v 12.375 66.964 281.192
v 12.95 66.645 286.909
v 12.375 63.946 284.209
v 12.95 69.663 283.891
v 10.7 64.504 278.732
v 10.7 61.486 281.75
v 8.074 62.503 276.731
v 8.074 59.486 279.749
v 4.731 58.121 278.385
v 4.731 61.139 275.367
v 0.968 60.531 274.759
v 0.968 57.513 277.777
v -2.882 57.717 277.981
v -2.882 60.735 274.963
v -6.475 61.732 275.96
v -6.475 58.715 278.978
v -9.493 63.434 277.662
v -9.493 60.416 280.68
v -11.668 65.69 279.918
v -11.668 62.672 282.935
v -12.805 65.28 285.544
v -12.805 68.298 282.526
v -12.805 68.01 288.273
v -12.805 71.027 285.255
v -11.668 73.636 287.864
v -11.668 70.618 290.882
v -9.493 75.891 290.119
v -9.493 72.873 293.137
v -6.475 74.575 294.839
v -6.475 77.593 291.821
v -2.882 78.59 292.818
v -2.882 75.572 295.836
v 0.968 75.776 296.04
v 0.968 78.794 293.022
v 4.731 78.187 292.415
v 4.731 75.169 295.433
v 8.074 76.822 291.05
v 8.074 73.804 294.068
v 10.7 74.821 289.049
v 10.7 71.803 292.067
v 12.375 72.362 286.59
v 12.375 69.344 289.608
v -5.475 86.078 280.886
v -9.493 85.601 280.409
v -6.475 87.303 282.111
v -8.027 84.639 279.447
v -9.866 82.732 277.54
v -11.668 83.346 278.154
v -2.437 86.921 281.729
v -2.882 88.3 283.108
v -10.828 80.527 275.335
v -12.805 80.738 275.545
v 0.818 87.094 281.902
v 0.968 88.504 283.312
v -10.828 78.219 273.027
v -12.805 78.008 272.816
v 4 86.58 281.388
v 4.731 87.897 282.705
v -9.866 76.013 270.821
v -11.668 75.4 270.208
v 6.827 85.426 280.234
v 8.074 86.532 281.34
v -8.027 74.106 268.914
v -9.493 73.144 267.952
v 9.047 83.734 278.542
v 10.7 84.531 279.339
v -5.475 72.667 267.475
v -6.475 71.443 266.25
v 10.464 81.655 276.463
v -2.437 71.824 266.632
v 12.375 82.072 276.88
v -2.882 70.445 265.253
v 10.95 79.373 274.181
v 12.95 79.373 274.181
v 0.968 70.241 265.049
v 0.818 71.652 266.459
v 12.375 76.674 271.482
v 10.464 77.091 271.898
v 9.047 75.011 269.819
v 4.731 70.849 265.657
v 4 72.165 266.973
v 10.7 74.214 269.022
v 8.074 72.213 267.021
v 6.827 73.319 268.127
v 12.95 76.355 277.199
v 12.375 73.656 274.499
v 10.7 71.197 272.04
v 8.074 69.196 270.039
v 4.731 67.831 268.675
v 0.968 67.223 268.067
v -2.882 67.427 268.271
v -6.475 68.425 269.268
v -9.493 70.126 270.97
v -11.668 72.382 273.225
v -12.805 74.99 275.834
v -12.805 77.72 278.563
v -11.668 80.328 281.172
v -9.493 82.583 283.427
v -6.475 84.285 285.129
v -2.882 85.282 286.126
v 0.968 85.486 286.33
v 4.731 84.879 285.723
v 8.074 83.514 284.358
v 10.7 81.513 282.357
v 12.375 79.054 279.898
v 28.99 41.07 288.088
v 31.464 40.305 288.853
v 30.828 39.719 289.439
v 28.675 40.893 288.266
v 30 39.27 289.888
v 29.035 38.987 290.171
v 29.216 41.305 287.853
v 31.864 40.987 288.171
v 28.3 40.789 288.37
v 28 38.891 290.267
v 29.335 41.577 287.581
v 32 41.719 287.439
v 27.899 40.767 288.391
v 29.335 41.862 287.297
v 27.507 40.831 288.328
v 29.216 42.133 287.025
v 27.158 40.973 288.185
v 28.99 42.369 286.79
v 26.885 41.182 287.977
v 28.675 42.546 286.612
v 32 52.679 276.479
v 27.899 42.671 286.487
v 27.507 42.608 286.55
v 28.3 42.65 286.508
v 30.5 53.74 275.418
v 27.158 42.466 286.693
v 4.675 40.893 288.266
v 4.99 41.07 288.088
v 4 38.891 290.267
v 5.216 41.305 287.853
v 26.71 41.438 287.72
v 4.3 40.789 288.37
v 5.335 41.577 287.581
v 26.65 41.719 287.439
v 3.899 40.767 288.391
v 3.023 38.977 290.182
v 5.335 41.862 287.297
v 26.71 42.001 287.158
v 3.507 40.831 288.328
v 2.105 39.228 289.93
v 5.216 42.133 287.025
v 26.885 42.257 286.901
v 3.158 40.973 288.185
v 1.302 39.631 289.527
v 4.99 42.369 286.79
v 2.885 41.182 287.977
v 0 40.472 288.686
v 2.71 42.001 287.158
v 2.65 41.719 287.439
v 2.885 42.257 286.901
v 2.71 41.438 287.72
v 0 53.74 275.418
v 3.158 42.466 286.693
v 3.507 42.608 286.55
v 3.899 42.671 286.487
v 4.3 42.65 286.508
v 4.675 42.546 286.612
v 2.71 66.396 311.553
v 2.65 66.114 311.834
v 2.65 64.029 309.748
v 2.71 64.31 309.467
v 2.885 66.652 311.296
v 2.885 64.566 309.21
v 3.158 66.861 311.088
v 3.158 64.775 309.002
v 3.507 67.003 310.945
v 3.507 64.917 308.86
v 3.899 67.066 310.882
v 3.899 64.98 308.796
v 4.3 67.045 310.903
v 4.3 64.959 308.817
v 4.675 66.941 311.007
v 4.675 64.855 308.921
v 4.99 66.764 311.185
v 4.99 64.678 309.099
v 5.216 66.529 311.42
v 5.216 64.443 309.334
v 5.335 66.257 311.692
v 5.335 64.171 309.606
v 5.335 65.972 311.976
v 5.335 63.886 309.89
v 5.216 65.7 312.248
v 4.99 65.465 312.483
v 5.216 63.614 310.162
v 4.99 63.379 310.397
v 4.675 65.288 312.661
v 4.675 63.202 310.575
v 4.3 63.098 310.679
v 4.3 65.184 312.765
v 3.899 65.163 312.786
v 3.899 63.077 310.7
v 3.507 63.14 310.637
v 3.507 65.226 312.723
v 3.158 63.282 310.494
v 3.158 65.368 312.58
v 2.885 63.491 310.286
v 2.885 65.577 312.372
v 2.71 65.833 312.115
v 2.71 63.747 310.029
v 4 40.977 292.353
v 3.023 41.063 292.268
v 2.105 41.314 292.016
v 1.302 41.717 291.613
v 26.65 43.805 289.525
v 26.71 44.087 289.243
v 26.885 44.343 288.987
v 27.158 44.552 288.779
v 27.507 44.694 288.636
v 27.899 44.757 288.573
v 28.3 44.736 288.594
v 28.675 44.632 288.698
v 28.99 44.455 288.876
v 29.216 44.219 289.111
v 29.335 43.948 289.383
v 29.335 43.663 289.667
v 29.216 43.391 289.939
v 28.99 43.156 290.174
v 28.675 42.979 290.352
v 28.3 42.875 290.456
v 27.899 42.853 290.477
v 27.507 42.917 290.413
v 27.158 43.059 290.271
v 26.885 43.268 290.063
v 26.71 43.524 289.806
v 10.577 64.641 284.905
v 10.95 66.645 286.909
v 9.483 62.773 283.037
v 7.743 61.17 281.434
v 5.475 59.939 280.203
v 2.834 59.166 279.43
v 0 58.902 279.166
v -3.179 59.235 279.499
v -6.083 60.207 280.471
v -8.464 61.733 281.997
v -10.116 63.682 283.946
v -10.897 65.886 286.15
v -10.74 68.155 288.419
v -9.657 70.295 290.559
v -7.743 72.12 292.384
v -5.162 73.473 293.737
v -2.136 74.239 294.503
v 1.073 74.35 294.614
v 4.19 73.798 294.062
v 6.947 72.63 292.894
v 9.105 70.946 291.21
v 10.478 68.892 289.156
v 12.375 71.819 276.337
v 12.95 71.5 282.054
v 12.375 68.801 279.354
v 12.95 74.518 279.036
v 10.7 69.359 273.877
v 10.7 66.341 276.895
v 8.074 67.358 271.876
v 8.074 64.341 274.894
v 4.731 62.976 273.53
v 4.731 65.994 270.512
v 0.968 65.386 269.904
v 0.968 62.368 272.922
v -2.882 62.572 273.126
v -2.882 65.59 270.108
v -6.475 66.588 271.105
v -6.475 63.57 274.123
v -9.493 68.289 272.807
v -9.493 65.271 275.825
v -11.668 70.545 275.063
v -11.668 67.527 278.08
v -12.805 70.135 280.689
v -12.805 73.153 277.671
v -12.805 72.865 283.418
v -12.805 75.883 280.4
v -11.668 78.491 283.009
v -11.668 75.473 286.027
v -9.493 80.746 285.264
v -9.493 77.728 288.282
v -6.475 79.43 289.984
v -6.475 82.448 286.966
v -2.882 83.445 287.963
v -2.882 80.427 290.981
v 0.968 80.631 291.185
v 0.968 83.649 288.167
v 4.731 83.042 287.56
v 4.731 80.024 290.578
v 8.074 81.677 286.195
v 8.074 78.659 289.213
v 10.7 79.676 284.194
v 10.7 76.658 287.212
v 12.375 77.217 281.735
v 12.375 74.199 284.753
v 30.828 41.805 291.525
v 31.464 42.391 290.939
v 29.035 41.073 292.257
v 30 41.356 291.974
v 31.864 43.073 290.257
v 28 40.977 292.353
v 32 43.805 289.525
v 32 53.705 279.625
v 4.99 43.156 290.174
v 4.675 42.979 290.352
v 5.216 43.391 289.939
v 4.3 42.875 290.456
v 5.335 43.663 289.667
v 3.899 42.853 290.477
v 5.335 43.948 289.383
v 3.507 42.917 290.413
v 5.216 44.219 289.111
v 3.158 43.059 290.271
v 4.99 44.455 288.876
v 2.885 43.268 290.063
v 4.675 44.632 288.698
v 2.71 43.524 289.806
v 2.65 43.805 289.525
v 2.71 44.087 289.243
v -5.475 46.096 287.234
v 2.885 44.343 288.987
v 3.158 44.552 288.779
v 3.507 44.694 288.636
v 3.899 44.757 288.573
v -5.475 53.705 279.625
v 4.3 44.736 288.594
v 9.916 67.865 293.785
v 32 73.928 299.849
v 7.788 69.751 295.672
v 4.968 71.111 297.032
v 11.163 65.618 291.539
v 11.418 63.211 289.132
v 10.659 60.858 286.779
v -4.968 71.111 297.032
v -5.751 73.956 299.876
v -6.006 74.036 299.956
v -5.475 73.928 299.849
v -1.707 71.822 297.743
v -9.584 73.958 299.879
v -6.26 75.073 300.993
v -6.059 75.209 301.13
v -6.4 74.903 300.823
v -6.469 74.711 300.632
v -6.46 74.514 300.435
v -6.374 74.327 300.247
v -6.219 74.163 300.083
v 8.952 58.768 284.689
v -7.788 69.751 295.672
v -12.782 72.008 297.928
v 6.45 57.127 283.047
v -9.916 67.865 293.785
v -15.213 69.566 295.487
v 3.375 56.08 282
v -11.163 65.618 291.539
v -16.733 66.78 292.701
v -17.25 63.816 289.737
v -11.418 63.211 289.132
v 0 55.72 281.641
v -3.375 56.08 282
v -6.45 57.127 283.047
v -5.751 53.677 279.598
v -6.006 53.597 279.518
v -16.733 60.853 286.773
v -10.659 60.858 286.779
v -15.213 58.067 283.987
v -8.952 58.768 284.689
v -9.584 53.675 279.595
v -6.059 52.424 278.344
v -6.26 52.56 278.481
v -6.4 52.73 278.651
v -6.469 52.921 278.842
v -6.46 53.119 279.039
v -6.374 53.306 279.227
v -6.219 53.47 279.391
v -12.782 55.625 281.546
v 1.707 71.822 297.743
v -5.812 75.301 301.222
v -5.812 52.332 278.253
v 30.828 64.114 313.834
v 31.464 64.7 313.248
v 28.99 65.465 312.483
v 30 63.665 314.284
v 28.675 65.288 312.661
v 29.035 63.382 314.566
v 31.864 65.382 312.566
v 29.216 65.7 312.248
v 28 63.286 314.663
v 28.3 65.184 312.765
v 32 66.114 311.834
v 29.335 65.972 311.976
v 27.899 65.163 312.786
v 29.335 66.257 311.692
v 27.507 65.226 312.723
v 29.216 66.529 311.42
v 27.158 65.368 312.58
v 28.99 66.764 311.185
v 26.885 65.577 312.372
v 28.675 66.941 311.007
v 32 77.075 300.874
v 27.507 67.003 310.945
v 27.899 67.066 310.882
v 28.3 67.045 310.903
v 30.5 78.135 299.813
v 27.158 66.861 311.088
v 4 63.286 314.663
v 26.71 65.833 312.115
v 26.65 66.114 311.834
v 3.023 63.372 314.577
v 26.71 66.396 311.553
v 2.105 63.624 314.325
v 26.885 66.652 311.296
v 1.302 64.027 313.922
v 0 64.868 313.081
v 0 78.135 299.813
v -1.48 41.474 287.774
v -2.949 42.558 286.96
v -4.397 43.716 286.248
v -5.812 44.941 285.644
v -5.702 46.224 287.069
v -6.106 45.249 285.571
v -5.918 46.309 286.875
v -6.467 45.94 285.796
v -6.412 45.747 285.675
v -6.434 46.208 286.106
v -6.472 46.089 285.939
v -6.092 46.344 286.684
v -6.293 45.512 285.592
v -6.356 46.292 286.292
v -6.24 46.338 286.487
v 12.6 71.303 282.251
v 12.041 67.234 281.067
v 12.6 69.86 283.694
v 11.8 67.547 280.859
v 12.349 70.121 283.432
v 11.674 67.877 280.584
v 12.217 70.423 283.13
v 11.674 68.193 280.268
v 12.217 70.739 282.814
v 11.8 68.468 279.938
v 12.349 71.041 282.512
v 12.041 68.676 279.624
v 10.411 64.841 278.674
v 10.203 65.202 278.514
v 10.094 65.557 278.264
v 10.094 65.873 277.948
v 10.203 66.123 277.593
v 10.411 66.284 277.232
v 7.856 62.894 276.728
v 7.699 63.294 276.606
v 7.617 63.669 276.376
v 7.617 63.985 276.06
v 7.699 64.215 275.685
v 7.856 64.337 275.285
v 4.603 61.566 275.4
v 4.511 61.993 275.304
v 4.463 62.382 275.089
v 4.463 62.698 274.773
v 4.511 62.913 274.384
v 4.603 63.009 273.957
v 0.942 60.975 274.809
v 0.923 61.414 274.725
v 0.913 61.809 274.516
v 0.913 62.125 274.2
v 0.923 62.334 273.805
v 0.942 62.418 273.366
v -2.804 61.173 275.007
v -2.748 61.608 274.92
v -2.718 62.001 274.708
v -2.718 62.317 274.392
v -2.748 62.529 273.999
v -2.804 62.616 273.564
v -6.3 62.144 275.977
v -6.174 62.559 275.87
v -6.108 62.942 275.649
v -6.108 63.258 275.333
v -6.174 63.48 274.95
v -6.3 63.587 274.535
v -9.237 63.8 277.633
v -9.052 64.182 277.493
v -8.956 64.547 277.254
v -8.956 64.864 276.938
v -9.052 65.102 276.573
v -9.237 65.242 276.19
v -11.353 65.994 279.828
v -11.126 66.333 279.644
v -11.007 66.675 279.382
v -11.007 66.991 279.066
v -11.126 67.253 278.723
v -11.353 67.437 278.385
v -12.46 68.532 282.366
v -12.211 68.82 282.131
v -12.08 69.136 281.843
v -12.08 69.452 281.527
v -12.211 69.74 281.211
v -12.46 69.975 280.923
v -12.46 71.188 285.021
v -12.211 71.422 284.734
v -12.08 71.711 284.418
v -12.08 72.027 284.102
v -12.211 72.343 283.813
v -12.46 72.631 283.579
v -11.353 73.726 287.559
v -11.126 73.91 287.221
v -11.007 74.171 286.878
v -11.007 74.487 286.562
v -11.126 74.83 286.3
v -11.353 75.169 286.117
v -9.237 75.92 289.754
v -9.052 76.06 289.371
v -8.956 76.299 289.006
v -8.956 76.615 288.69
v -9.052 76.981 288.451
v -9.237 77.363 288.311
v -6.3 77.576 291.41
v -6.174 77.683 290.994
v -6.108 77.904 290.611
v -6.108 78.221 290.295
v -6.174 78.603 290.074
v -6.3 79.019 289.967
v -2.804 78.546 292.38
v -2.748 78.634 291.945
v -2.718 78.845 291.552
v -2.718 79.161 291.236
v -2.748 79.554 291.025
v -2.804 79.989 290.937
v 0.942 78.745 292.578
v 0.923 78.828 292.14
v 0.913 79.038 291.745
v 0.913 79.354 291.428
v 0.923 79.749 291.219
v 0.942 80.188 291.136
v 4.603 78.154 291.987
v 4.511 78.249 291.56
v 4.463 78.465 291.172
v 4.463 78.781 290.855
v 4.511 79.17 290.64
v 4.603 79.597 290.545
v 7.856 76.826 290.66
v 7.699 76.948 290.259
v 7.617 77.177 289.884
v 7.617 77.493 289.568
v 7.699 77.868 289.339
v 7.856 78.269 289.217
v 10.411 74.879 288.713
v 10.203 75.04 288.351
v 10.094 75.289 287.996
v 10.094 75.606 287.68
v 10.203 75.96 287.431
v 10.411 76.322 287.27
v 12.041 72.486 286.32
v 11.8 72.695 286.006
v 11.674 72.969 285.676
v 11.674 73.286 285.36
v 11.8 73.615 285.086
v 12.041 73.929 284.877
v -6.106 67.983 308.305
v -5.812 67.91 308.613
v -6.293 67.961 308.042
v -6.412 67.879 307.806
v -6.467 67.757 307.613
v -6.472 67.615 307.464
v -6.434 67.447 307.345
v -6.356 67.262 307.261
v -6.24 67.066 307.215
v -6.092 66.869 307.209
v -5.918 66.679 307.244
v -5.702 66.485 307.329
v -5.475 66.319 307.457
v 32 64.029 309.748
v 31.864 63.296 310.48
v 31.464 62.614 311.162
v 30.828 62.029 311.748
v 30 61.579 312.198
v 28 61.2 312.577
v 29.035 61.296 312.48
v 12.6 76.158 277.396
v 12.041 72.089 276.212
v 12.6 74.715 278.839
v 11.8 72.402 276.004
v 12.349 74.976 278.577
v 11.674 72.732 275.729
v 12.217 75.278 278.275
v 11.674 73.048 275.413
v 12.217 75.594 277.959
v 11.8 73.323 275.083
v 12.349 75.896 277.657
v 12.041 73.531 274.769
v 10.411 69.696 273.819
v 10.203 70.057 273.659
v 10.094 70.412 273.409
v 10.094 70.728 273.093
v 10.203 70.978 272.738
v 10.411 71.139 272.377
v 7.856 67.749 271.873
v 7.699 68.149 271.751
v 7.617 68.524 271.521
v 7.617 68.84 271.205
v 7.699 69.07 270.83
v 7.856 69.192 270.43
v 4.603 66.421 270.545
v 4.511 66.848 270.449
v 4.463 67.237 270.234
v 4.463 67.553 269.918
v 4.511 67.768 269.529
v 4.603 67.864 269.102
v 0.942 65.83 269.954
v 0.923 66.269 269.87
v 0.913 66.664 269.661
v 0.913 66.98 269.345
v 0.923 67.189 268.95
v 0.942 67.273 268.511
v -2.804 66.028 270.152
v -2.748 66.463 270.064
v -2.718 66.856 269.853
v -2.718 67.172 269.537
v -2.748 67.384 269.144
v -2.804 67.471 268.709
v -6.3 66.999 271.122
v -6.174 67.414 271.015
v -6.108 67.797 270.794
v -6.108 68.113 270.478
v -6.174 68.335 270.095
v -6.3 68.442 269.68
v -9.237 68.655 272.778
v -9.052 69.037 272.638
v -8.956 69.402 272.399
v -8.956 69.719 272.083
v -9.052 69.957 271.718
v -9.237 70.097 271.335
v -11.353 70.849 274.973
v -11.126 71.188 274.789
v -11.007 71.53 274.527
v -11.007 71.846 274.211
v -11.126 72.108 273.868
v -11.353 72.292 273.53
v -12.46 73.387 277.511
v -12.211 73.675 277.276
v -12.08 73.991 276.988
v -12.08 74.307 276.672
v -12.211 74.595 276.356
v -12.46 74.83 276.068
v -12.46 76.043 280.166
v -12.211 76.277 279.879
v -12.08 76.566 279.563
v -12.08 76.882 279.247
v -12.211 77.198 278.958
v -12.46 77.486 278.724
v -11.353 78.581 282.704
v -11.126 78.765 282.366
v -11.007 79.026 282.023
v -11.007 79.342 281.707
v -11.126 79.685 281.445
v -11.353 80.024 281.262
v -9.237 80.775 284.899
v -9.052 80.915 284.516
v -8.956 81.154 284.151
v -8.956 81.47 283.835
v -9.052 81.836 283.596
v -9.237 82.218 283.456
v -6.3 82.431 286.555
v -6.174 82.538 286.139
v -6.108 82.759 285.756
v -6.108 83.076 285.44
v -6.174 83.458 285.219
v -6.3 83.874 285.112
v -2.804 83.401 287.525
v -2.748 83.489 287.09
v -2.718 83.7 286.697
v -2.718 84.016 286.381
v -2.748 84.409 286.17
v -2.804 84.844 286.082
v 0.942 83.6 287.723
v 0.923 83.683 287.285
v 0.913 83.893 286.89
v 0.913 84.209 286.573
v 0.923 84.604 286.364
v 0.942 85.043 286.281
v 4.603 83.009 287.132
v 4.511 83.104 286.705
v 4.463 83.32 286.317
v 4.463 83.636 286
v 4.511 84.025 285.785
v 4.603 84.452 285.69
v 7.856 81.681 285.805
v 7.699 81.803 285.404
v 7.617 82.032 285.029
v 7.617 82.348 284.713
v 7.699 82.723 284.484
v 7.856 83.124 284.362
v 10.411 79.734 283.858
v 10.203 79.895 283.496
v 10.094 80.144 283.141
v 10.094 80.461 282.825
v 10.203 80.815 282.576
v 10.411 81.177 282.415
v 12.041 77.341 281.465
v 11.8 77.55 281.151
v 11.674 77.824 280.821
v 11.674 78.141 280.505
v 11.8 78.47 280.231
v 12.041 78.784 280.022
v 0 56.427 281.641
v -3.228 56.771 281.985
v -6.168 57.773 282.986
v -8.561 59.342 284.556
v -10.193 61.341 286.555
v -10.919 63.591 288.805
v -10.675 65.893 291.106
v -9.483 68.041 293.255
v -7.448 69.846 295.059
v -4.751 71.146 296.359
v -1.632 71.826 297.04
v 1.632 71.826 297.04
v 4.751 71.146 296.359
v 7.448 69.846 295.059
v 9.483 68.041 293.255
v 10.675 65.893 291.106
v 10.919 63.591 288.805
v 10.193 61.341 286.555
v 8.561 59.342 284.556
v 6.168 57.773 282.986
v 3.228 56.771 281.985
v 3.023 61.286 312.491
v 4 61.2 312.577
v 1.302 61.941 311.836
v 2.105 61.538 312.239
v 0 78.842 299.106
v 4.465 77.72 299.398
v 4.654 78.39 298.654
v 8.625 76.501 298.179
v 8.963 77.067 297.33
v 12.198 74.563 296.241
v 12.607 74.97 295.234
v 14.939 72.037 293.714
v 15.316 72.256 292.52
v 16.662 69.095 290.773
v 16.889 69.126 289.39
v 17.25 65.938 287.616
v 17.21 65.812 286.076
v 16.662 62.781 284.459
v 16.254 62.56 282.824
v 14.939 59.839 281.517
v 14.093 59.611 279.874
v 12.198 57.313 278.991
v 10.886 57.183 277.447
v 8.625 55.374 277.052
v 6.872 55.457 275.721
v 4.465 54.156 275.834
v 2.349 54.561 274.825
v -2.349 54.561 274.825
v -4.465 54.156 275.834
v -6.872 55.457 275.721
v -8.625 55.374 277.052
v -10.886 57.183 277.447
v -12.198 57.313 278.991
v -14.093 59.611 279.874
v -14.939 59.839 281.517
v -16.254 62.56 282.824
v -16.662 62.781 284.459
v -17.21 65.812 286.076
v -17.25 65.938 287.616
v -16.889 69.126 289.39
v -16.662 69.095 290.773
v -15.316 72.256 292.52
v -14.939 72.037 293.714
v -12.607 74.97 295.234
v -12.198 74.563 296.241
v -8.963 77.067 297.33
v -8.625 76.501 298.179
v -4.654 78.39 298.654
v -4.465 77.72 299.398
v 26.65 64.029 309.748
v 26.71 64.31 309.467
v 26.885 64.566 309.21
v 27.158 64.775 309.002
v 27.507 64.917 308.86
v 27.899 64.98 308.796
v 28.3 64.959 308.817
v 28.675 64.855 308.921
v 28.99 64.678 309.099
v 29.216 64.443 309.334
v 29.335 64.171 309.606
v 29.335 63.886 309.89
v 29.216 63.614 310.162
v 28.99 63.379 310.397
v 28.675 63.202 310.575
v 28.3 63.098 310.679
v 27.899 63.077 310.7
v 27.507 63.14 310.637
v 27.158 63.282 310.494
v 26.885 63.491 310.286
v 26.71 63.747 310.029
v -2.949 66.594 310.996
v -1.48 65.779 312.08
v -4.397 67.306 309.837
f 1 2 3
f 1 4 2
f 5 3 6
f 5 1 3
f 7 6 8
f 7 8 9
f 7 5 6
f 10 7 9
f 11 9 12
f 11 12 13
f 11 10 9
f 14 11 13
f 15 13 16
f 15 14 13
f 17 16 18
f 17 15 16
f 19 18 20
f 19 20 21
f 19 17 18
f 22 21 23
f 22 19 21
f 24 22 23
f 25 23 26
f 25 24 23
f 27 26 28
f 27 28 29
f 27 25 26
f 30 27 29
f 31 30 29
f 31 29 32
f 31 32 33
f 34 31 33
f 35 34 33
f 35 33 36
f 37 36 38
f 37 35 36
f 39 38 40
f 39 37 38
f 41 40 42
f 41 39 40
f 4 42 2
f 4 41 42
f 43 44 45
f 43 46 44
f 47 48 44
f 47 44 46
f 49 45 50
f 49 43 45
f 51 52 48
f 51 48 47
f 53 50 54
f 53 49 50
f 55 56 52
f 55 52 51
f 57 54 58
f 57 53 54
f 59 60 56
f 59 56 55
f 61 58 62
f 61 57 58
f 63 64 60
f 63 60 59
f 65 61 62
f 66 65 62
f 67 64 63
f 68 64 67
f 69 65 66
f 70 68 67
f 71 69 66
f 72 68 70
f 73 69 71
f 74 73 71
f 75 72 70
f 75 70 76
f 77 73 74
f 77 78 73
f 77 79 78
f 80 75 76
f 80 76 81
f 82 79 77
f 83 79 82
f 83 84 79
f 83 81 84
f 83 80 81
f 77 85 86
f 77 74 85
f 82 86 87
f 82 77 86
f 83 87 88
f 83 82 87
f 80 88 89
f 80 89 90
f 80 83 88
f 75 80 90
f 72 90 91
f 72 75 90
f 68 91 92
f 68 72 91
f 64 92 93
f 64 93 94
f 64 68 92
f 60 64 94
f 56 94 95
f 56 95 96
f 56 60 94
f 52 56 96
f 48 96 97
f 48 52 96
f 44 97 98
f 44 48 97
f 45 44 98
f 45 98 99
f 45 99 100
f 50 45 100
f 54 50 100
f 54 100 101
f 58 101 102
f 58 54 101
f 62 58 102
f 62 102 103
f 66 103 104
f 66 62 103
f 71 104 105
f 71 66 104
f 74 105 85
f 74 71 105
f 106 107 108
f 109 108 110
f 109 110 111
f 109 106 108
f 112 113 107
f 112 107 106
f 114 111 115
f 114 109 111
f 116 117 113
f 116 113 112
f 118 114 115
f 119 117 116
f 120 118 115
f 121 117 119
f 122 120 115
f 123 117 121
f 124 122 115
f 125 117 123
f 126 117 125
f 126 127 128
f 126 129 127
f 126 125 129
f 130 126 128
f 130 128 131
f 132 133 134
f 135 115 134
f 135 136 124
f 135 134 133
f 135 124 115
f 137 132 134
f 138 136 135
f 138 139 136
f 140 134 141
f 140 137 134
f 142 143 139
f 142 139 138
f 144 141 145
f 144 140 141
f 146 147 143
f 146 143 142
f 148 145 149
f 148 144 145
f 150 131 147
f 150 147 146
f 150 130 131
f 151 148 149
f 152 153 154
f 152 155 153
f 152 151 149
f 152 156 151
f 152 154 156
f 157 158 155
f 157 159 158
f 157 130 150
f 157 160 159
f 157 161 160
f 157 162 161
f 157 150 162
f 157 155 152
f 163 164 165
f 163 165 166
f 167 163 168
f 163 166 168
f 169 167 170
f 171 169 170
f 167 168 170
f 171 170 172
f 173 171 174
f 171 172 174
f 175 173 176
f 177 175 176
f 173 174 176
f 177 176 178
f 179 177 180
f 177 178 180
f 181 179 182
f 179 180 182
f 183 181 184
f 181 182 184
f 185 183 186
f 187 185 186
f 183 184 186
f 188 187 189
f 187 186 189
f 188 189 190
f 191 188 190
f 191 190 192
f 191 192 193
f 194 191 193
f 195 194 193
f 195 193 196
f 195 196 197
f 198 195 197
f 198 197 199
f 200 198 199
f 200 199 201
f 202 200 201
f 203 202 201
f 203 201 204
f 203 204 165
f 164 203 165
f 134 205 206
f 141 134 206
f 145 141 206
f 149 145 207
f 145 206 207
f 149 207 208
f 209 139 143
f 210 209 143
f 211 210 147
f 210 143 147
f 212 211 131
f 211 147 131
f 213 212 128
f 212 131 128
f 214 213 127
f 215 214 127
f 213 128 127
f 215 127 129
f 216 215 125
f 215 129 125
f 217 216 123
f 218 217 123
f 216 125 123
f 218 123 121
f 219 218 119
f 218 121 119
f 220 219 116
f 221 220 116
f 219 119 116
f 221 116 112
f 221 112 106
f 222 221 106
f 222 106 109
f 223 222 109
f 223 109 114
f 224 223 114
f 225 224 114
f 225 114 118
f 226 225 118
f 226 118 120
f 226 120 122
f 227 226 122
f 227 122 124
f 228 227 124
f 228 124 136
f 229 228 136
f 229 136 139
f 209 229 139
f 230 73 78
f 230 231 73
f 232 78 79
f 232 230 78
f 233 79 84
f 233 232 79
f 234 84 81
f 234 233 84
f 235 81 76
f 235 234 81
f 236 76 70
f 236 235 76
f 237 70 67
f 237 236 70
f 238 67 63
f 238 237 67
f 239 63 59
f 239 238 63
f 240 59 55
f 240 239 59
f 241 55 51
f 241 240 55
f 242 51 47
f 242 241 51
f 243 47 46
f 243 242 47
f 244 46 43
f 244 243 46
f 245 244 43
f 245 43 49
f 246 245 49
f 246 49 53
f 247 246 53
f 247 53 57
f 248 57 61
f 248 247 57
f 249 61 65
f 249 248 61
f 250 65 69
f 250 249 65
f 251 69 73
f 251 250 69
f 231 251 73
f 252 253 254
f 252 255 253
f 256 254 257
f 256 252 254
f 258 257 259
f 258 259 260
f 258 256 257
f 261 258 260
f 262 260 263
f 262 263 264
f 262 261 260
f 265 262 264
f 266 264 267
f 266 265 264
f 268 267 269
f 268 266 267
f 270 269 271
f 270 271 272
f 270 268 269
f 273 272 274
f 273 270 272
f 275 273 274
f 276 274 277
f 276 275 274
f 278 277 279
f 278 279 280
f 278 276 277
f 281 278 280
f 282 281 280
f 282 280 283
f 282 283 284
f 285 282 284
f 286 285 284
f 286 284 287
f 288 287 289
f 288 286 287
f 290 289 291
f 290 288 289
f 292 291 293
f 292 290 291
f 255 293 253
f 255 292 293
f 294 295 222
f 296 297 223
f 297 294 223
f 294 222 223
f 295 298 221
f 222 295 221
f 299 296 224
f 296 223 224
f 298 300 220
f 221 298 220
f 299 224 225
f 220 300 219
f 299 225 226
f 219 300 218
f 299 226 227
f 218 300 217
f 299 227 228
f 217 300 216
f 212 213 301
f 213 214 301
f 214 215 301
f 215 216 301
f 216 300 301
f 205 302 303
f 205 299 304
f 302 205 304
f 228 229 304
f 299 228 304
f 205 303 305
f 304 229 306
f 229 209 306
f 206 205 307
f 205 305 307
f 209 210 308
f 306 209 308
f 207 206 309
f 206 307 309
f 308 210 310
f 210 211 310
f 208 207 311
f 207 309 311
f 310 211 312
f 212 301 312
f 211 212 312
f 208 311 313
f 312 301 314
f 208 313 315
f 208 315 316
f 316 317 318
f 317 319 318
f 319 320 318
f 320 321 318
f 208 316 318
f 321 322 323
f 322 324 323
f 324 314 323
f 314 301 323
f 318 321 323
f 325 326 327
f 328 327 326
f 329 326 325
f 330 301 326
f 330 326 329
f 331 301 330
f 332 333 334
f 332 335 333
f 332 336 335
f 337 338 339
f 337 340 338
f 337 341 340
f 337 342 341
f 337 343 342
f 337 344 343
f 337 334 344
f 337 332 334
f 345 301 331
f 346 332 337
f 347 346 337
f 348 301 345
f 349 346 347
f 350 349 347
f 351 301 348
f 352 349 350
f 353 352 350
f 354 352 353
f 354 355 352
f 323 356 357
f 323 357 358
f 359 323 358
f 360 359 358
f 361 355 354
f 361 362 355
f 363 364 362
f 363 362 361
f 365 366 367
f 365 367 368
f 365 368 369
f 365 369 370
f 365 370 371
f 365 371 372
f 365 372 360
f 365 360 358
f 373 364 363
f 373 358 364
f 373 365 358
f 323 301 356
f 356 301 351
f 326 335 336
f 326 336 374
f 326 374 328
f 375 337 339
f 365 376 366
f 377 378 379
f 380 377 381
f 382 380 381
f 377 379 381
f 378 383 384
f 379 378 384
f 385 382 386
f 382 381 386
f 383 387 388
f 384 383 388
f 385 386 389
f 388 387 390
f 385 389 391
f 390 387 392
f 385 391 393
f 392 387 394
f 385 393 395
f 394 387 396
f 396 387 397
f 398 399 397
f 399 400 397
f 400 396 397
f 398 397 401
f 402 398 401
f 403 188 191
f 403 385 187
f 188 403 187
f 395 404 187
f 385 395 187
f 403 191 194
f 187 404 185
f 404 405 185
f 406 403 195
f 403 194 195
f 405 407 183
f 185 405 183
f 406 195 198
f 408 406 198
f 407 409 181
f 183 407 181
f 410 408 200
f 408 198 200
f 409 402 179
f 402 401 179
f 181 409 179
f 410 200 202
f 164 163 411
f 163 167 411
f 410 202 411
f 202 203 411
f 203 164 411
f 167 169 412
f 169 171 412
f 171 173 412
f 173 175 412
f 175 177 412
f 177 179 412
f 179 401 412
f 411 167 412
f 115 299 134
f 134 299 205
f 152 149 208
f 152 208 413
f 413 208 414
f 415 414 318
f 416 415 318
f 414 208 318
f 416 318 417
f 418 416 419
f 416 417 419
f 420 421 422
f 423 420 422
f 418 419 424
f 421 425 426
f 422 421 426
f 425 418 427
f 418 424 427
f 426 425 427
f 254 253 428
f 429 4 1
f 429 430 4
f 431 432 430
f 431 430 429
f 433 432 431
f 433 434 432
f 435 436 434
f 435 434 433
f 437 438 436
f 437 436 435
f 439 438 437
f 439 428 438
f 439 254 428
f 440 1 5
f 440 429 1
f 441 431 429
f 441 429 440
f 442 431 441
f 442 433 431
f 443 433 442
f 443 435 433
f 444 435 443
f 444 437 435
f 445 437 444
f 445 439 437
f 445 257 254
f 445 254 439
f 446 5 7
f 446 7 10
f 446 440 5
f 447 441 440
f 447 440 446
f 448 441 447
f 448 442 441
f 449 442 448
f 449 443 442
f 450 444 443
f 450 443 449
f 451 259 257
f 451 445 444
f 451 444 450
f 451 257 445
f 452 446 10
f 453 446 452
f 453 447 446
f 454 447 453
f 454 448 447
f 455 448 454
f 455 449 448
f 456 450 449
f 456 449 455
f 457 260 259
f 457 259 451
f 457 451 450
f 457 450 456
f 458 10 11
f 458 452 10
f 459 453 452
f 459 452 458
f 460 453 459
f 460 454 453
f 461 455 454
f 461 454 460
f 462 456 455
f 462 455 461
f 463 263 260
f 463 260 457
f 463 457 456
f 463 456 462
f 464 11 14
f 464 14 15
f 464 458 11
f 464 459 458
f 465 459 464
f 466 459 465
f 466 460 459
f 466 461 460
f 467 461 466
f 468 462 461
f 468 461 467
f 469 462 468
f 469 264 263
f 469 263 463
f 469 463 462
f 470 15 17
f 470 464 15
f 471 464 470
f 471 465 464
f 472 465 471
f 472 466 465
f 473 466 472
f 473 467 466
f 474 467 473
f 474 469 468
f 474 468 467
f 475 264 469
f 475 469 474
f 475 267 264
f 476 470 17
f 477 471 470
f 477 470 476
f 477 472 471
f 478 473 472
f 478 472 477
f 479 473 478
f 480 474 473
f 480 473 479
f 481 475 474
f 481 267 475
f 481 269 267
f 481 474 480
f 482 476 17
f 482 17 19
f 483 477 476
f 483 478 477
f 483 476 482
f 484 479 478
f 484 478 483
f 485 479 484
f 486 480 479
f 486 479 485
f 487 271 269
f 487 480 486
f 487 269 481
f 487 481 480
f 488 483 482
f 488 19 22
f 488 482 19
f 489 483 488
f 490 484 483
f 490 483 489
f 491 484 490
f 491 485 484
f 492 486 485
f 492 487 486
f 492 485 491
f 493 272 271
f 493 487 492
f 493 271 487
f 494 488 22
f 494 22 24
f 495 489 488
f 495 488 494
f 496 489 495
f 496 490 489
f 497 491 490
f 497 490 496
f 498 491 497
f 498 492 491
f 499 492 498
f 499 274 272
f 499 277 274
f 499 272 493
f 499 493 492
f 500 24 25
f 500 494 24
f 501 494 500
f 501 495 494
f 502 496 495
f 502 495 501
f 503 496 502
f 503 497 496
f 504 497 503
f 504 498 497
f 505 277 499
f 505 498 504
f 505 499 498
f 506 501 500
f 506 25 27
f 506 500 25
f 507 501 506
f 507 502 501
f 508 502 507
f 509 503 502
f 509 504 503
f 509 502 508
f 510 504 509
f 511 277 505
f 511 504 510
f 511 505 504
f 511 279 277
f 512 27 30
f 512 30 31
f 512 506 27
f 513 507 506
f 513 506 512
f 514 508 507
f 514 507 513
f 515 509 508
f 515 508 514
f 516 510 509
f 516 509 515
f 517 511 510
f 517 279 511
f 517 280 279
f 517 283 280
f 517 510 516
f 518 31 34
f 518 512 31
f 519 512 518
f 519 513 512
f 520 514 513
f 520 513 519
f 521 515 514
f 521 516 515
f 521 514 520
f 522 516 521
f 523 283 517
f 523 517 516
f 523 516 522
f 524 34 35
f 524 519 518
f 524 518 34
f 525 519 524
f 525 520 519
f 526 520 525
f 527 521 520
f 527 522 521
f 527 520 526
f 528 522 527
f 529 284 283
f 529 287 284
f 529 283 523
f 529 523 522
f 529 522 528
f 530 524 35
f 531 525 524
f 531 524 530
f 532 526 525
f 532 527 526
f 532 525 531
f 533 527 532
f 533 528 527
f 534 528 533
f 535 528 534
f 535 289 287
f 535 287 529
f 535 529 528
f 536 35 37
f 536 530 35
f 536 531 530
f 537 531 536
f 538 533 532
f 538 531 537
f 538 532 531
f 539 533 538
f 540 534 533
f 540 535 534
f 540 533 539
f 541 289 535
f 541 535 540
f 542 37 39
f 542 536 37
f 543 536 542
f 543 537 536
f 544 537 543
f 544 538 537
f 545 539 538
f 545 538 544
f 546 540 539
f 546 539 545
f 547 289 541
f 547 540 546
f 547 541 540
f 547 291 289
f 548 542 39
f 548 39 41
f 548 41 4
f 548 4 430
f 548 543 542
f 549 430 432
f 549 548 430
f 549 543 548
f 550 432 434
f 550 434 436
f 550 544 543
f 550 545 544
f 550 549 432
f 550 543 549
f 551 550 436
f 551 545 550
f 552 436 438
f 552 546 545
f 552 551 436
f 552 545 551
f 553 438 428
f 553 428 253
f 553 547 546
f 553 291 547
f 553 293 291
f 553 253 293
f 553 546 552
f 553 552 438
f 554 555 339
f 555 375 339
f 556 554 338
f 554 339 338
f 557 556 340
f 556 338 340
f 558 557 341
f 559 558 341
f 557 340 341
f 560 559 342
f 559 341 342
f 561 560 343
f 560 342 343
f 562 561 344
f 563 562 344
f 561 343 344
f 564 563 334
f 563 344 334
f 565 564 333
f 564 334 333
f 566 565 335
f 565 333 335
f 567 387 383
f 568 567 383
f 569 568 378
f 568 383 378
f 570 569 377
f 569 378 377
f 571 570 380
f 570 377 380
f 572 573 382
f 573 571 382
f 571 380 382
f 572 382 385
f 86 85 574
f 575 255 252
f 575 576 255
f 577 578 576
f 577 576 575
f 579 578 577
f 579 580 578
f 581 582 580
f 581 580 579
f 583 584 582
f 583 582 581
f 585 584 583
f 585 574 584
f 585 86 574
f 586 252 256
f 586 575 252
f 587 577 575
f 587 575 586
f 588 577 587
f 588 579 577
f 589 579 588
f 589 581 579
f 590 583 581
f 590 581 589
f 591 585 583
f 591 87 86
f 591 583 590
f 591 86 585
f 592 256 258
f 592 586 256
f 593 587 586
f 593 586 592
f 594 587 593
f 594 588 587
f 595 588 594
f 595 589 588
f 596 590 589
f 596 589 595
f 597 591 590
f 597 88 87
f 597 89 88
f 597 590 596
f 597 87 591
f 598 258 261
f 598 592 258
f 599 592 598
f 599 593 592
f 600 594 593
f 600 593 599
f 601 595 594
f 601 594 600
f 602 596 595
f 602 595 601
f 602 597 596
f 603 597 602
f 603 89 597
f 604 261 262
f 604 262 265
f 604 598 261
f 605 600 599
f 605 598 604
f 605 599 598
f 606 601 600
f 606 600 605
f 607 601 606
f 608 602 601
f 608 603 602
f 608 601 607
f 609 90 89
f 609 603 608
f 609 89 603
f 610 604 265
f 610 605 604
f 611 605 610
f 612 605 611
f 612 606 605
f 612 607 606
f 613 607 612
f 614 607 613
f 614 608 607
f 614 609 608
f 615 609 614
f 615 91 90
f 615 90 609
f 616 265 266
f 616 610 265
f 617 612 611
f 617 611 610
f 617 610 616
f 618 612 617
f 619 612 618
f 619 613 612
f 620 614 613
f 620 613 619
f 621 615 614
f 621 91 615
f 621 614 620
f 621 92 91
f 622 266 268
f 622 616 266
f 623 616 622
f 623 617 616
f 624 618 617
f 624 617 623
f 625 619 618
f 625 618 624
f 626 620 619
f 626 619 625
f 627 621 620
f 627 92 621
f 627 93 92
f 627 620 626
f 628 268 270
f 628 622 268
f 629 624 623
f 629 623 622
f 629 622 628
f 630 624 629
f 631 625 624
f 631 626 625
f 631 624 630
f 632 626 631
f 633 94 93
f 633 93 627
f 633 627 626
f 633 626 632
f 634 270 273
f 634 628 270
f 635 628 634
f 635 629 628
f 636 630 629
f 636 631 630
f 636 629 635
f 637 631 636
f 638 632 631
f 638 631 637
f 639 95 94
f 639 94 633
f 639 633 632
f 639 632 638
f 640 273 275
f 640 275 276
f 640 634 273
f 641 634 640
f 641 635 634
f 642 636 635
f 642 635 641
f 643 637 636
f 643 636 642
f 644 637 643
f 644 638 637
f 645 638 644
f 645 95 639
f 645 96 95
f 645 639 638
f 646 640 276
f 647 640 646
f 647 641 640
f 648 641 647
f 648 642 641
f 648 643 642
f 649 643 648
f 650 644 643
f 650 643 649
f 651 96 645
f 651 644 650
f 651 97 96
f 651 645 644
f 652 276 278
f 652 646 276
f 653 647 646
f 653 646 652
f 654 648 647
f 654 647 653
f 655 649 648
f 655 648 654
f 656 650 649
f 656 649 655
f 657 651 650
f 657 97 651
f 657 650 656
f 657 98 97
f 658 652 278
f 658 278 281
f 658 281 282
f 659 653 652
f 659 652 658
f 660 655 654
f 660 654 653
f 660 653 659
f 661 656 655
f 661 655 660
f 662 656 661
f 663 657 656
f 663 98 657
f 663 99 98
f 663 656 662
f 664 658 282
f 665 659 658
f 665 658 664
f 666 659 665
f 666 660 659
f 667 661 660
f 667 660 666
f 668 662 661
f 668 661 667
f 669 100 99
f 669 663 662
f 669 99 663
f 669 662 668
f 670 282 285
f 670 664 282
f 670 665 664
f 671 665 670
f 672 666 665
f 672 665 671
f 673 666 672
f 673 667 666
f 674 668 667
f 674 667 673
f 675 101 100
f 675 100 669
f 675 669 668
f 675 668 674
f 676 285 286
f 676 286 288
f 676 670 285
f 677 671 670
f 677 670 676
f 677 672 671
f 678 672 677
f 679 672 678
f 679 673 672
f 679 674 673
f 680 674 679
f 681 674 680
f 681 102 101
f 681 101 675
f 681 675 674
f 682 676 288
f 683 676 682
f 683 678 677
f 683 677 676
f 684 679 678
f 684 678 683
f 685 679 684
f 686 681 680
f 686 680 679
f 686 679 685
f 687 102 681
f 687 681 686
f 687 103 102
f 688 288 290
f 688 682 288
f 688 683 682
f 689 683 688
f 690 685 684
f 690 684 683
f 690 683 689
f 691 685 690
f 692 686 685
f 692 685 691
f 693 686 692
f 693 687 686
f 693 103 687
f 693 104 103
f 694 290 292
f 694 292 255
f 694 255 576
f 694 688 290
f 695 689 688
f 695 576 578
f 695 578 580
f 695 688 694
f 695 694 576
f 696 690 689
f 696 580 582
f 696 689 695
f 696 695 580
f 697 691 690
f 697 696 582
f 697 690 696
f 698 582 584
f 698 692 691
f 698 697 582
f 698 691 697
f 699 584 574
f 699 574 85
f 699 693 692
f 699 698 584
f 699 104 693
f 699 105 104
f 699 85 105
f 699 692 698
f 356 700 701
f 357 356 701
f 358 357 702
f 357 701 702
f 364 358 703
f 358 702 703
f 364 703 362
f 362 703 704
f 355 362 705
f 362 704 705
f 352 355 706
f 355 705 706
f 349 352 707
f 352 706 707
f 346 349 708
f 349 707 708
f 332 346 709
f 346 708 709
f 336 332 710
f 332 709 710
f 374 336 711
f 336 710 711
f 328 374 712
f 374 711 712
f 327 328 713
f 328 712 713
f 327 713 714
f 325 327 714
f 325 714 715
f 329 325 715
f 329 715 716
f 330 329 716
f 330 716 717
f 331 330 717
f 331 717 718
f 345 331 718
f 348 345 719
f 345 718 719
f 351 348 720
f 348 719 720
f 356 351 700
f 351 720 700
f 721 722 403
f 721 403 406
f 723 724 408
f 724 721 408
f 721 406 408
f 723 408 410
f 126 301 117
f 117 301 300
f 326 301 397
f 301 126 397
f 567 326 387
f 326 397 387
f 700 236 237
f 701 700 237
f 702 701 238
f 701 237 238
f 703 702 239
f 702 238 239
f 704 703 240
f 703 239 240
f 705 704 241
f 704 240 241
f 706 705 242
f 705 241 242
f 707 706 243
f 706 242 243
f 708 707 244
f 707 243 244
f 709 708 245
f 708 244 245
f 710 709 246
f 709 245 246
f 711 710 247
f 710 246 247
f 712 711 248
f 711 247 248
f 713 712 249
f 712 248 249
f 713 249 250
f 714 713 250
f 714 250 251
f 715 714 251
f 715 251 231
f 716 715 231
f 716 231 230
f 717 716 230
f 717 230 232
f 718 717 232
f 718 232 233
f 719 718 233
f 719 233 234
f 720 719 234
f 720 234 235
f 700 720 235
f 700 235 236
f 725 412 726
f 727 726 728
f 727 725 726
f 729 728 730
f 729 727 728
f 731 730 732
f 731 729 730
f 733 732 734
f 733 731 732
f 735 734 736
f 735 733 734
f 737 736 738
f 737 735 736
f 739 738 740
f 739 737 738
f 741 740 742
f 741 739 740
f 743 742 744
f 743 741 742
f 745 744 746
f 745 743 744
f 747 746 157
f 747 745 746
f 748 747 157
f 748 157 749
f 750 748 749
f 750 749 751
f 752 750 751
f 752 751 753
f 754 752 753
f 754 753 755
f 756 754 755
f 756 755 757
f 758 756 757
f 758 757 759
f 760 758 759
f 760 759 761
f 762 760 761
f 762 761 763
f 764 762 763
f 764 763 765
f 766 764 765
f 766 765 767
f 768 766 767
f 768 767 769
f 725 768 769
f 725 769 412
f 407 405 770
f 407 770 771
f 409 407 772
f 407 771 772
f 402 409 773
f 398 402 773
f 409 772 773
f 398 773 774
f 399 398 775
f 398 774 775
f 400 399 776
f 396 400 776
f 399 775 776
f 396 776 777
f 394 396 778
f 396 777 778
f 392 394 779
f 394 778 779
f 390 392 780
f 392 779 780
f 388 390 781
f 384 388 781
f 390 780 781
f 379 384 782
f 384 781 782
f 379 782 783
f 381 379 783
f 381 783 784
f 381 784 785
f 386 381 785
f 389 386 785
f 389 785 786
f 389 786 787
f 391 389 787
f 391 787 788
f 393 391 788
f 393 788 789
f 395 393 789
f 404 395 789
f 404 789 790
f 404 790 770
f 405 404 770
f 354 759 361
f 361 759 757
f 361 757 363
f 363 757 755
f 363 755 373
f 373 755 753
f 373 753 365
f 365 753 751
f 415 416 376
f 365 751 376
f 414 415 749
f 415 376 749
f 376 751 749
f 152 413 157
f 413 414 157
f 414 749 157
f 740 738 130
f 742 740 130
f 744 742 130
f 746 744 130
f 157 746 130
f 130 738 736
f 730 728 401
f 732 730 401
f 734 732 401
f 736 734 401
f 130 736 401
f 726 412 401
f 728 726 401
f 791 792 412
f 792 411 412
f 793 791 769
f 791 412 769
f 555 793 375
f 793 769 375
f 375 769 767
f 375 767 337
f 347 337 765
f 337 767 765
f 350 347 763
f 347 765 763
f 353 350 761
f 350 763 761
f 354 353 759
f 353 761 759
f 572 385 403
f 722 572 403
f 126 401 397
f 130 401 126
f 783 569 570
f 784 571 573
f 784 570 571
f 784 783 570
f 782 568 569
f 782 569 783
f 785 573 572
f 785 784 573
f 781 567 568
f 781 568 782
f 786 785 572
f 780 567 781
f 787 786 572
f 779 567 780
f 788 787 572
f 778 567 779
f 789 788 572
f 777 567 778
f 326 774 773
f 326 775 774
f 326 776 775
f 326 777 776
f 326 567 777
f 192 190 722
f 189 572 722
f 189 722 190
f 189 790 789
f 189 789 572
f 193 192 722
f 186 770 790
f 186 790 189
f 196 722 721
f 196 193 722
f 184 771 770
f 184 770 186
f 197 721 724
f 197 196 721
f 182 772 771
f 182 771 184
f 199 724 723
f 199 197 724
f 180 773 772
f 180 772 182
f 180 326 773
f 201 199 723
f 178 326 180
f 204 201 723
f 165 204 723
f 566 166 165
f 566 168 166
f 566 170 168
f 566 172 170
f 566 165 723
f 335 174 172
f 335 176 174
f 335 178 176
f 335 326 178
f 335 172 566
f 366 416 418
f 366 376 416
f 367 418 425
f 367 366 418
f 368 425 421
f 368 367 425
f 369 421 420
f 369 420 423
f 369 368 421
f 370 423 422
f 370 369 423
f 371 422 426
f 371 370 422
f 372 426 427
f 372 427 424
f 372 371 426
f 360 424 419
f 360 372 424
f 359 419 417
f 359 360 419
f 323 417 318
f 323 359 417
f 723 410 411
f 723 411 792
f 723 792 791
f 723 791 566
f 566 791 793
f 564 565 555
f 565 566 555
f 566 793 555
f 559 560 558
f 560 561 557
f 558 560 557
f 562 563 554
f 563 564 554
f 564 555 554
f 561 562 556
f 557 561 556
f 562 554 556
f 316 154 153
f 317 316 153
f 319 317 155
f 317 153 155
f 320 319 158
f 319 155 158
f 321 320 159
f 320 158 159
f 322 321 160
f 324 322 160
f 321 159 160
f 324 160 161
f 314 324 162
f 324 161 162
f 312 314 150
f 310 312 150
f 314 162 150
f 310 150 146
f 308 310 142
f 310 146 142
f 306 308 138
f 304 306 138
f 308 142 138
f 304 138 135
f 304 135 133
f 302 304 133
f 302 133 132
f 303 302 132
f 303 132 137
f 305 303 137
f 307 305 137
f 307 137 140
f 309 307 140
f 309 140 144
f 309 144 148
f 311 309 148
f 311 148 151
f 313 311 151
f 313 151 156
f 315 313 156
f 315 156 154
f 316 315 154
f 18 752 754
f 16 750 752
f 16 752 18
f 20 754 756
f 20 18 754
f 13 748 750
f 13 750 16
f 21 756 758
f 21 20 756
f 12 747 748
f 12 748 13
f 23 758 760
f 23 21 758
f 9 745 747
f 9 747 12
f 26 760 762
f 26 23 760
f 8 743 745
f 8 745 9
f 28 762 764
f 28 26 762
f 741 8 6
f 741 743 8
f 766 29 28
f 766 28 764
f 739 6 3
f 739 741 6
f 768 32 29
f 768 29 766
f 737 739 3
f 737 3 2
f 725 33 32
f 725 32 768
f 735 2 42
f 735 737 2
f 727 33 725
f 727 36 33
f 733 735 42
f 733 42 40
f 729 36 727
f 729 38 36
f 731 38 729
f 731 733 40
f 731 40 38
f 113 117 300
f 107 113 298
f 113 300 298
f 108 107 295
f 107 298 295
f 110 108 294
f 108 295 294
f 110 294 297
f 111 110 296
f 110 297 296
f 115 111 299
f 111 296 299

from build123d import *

# Parameters (mm, degrees)
SKETCH11_R               = 17.249999999999545
BOSS_EXTRUDE2_DEPTH      = 1
BOSS_EXTRUDE1_DEPTH      = 17.25
BOSS_EXTRUDE1_DEPTH_BACK = 17.25
CUT_EXTRUDE1_START       = -14.25
SKETCH8_W                = 52.49999999999948
SKETCH8_H                = 37.00000000000014
CUT_EXTRUDE1_DEPTH       = 28.5
M2_5_CLEARANCE_HOLE1_D   = 2.7
CUT_EXTRUDE2_DEPTH       = 287.9075330139404
MOVE_FACE1_BY            = 0.05
MOVE_FACE1_2_BY          = 0.05
FILLET3_R                = 1
SKETCH13_R               = 10.949999999999743
CUT_EXTRUDE3_DEPTH       = 287.92025460072404
CHAMFER1_SIZE            = 0.5
CHAMFER2_SIZE            = 1.5


# Read off the part's stored shape, not the designer's step: Glue_In_Plug
with BuildPart() as part:
    # Glue_In_Plug outline → Glue_In_Plug (revolve)
    with BuildSketch(Plane(origin=(0, 176.776695297, 176.776695297), x_dir=(1, 0, 0), z_dir=(0, 0.707106781186551, 0.707106781186544))):
        with BuildLine():
            Line((12.95, -137.75), (10.95, -137.75))
            Line((10.95, -137.75), (10.95, -156.75))
            Line((10.95, -156.75), (15, -156.75))
            Line((15, -156.75), (15, -155.75))
            Line((15, -155.75), (12.95, -155.75))
            Line((12.95, -155.75), (12.95, -151.482050808))
            ThreePointArc((12.95, -151.482050808), (12.2, -150.183012702), (12.95, -148.883974596))
            Line((12.95, -148.883974596), (12.95, -144.616025404))
            ThreePointArc((12.95, -144.616025404), (12.2, -143.316987298), (12.95, -142.017949192))
            Line((12.95, -142.017949192), (12.95, -137.75))
        make_face()
    revolve(axis=Axis((0, 176.776695297, 176.776695297), (0, 0.707106781186544, -0.707106781186551)))

    # Sketch11 → Boss-Extrude2 (add)
    with BuildSketch(Plane(origin=(0, -110.13188116980581, 110.13188116980702), x_dir=(1, 0, 0), z_dir=(0, 0.7071067811865438, -0.7071067811865513))):
        with Locations(Location((0, -250, 0), (0, 0, 270))):
            Circle(SKETCH11_R)
    extrude(amount=-BOSS_EXTRUDE2_DEPTH)

    # Sketch6 → Boss-Extrude1 (add, two sides: drawn at the far end of the back side and taken through both)
    with BuildSketch(Plane(origin=(0, 176.7766952966368, 176.77669529663697), x_dir=(-1, 0, 0), z_dir=(0, -0.7071067811865477, -0.7071067811865475)).offset(-BOSS_EXTRUDE1_DEPTH_BACK)):
        with BuildLine():
            Line((-32, -156.75000000000077), (-32.00000000000001, -173.7500000000009))
            ThreePointArc((-32.00000000000001, -173.7500000000009), (-30.828427124746195, -176.5784271247471), (-27.999999999999996, -177.75000000000088))
            Line((-27.999999999999996, -177.75000000000088), (-4.0000000000000036, -177.75000000000088))
            ThreePointArc((-4.0000000000000036, -177.75000000000088), (-2.5528006726860175, -177.47902321084604), (-1.3016800588632904, -176.7028070535119))
            Line((-1.3016800588632904, -176.7028070535119), (17.249999999999545, -159.75000000000082))
            Line((17.249999999999545, -159.75000000000082), (17.249999999999545, -156.75000000000077))
            Line((17.249999999999545, -156.75000000000077), (-32, -156.75000000000077))
        make_face()
    extrude(amount=BOSS_EXTRUDE1_DEPTH + BOSS_EXTRUDE1_DEPTH_BACK)

    # Sketch8 → Cut-Extrude1 (cut)
    with BuildSketch(Plane(origin=(0, 176.7766952966368, 176.77669529663697), x_dir=(-1, 0, 0), z_dir=(0, -0.7071067811865477, -0.7071067811865475)).offset(CUT_EXTRUDE1_START)):
        with Locations((-9.000000000000195, -178.2500000000009)):
            Rectangle(SKETCH8_W, SKETCH8_H)
    extrude(amount=CUT_EXTRUDE1_DEPTH, mode=Mode.SUBTRACT)

    # M2.5 Clearance Hole1 (through all)
    with Locations(Plane(origin=(0, 188.97428727210456, 188.9742872721045), x_dir=(1, 0, 0), z_dir=(0, 0.7071067811865476, 0.7071067811865476))):
        with Locations((4, -173.75), (28, -173.75)):
            Hole(M2_5_CLEARANCE_HOLE1_D / 2)

    # Sketch12 → Cut-Extrude2 (cut, through all)
    with BuildSketch(Plane(origin=(0, -110.838987950992, 110.83898795099203), x_dir=(1, 7e-16, -7e-16), z_dir=(0, 0.7071067811865476, -0.7071067811865476))):
        with BuildLine():
            Line((-17.249999999999545, -250.00000000000088), (-17.249999999999545, -267.24999999999955))
            Line((-17.249999999999545, -267.24999999999955), (0, -267.24999999999955))
            ThreePointArc((-6.1e-16, -267.24999999999955), (-12.197591975467768, -262.1975919754684), (-17.249999999999538, -250.00000000000088))
        make_face()
        with BuildLine():
            Line((-17.249999999999545, -232.7499999999995), (-17.249999999999545, -250.00000000000088))
            ThreePointArc((-17.24999999999954, -250.00000000000088), (-12.197591975468656, -237.80240802453167), (0, -232.7499999999995))
            Line((0, -232.7499999999995), (-17.249999999999545, -232.7499999999995))
        make_face()
    extrude(amount=-CUT_EXTRUDE2_DEPTH, mode=Mode.SUBTRACT)

    # Move Face1: a face moved inward by 0.05
    extrude(part.faces().sort_by_distance((12.658853914, 47.847886018, 285.552961311))[0], amount=MOVE_FACE1_BY, dir=(0, -0.707106781, -0.707106781), mode=Mode.SUBTRACT)

    # Move Face1 2: a face moved inward by 0.05
    extrude(part.faces().sort_by_distance((12.658853914, 68.000429282, 305.705504575))[0], amount=MOVE_FACE1_2_BY, dir=(0, 0.707106781, 0.707106781), mode=Mode.SUBTRACT)

    # Fillet3
    fillet3_edges = [part.edges().sort_by_distance(p)[0] for p in [
        (-9.647408978600675, 71.47175017032276, 302.3048943648676),
        (-9.647408978601732, 51.24849622840657, 282.0816404229506),
    ]]
    fillet(fillet3_edges, radius=FILLET3_R)

    # Sketch13 → Cut-Extrude3 (cut, through all)
    with BuildSketch(Plane(origin=(0, -110.13188116980584, 110.13188116980702), x_dir=(1, 0, 0), z_dir=(0, 0.7071067811865438, -0.7071067811865512))):
        with Locations(Location((0, -250.0000000000001, 0), (0, 0, 90))):
            Circle(SKETCH13_R)
    extrude(amount=-CUT_EXTRUDE3_DEPTH, mode=Mode.SUBTRACT)

    # Chamfer1
    chamfer1_edges = [part.edges().sort_by_distance(p)[0] for p in [
        (-2.01e-15, 71.55920625607847, 297.4798228451817),
    ]]
    chamfer(chamfer1_edges, length=CHAMFER1_SIZE)

    # Chamfer2
    chamfer2_edges = [part.edges().sort_by_distance(p)[0] for p in [
        (32, 65.93770734564494, 287.6156832476289),
    ]]
    chamfer(chamfer2_edges, length=CHAMFER2_SIZE)


solid = part.part
